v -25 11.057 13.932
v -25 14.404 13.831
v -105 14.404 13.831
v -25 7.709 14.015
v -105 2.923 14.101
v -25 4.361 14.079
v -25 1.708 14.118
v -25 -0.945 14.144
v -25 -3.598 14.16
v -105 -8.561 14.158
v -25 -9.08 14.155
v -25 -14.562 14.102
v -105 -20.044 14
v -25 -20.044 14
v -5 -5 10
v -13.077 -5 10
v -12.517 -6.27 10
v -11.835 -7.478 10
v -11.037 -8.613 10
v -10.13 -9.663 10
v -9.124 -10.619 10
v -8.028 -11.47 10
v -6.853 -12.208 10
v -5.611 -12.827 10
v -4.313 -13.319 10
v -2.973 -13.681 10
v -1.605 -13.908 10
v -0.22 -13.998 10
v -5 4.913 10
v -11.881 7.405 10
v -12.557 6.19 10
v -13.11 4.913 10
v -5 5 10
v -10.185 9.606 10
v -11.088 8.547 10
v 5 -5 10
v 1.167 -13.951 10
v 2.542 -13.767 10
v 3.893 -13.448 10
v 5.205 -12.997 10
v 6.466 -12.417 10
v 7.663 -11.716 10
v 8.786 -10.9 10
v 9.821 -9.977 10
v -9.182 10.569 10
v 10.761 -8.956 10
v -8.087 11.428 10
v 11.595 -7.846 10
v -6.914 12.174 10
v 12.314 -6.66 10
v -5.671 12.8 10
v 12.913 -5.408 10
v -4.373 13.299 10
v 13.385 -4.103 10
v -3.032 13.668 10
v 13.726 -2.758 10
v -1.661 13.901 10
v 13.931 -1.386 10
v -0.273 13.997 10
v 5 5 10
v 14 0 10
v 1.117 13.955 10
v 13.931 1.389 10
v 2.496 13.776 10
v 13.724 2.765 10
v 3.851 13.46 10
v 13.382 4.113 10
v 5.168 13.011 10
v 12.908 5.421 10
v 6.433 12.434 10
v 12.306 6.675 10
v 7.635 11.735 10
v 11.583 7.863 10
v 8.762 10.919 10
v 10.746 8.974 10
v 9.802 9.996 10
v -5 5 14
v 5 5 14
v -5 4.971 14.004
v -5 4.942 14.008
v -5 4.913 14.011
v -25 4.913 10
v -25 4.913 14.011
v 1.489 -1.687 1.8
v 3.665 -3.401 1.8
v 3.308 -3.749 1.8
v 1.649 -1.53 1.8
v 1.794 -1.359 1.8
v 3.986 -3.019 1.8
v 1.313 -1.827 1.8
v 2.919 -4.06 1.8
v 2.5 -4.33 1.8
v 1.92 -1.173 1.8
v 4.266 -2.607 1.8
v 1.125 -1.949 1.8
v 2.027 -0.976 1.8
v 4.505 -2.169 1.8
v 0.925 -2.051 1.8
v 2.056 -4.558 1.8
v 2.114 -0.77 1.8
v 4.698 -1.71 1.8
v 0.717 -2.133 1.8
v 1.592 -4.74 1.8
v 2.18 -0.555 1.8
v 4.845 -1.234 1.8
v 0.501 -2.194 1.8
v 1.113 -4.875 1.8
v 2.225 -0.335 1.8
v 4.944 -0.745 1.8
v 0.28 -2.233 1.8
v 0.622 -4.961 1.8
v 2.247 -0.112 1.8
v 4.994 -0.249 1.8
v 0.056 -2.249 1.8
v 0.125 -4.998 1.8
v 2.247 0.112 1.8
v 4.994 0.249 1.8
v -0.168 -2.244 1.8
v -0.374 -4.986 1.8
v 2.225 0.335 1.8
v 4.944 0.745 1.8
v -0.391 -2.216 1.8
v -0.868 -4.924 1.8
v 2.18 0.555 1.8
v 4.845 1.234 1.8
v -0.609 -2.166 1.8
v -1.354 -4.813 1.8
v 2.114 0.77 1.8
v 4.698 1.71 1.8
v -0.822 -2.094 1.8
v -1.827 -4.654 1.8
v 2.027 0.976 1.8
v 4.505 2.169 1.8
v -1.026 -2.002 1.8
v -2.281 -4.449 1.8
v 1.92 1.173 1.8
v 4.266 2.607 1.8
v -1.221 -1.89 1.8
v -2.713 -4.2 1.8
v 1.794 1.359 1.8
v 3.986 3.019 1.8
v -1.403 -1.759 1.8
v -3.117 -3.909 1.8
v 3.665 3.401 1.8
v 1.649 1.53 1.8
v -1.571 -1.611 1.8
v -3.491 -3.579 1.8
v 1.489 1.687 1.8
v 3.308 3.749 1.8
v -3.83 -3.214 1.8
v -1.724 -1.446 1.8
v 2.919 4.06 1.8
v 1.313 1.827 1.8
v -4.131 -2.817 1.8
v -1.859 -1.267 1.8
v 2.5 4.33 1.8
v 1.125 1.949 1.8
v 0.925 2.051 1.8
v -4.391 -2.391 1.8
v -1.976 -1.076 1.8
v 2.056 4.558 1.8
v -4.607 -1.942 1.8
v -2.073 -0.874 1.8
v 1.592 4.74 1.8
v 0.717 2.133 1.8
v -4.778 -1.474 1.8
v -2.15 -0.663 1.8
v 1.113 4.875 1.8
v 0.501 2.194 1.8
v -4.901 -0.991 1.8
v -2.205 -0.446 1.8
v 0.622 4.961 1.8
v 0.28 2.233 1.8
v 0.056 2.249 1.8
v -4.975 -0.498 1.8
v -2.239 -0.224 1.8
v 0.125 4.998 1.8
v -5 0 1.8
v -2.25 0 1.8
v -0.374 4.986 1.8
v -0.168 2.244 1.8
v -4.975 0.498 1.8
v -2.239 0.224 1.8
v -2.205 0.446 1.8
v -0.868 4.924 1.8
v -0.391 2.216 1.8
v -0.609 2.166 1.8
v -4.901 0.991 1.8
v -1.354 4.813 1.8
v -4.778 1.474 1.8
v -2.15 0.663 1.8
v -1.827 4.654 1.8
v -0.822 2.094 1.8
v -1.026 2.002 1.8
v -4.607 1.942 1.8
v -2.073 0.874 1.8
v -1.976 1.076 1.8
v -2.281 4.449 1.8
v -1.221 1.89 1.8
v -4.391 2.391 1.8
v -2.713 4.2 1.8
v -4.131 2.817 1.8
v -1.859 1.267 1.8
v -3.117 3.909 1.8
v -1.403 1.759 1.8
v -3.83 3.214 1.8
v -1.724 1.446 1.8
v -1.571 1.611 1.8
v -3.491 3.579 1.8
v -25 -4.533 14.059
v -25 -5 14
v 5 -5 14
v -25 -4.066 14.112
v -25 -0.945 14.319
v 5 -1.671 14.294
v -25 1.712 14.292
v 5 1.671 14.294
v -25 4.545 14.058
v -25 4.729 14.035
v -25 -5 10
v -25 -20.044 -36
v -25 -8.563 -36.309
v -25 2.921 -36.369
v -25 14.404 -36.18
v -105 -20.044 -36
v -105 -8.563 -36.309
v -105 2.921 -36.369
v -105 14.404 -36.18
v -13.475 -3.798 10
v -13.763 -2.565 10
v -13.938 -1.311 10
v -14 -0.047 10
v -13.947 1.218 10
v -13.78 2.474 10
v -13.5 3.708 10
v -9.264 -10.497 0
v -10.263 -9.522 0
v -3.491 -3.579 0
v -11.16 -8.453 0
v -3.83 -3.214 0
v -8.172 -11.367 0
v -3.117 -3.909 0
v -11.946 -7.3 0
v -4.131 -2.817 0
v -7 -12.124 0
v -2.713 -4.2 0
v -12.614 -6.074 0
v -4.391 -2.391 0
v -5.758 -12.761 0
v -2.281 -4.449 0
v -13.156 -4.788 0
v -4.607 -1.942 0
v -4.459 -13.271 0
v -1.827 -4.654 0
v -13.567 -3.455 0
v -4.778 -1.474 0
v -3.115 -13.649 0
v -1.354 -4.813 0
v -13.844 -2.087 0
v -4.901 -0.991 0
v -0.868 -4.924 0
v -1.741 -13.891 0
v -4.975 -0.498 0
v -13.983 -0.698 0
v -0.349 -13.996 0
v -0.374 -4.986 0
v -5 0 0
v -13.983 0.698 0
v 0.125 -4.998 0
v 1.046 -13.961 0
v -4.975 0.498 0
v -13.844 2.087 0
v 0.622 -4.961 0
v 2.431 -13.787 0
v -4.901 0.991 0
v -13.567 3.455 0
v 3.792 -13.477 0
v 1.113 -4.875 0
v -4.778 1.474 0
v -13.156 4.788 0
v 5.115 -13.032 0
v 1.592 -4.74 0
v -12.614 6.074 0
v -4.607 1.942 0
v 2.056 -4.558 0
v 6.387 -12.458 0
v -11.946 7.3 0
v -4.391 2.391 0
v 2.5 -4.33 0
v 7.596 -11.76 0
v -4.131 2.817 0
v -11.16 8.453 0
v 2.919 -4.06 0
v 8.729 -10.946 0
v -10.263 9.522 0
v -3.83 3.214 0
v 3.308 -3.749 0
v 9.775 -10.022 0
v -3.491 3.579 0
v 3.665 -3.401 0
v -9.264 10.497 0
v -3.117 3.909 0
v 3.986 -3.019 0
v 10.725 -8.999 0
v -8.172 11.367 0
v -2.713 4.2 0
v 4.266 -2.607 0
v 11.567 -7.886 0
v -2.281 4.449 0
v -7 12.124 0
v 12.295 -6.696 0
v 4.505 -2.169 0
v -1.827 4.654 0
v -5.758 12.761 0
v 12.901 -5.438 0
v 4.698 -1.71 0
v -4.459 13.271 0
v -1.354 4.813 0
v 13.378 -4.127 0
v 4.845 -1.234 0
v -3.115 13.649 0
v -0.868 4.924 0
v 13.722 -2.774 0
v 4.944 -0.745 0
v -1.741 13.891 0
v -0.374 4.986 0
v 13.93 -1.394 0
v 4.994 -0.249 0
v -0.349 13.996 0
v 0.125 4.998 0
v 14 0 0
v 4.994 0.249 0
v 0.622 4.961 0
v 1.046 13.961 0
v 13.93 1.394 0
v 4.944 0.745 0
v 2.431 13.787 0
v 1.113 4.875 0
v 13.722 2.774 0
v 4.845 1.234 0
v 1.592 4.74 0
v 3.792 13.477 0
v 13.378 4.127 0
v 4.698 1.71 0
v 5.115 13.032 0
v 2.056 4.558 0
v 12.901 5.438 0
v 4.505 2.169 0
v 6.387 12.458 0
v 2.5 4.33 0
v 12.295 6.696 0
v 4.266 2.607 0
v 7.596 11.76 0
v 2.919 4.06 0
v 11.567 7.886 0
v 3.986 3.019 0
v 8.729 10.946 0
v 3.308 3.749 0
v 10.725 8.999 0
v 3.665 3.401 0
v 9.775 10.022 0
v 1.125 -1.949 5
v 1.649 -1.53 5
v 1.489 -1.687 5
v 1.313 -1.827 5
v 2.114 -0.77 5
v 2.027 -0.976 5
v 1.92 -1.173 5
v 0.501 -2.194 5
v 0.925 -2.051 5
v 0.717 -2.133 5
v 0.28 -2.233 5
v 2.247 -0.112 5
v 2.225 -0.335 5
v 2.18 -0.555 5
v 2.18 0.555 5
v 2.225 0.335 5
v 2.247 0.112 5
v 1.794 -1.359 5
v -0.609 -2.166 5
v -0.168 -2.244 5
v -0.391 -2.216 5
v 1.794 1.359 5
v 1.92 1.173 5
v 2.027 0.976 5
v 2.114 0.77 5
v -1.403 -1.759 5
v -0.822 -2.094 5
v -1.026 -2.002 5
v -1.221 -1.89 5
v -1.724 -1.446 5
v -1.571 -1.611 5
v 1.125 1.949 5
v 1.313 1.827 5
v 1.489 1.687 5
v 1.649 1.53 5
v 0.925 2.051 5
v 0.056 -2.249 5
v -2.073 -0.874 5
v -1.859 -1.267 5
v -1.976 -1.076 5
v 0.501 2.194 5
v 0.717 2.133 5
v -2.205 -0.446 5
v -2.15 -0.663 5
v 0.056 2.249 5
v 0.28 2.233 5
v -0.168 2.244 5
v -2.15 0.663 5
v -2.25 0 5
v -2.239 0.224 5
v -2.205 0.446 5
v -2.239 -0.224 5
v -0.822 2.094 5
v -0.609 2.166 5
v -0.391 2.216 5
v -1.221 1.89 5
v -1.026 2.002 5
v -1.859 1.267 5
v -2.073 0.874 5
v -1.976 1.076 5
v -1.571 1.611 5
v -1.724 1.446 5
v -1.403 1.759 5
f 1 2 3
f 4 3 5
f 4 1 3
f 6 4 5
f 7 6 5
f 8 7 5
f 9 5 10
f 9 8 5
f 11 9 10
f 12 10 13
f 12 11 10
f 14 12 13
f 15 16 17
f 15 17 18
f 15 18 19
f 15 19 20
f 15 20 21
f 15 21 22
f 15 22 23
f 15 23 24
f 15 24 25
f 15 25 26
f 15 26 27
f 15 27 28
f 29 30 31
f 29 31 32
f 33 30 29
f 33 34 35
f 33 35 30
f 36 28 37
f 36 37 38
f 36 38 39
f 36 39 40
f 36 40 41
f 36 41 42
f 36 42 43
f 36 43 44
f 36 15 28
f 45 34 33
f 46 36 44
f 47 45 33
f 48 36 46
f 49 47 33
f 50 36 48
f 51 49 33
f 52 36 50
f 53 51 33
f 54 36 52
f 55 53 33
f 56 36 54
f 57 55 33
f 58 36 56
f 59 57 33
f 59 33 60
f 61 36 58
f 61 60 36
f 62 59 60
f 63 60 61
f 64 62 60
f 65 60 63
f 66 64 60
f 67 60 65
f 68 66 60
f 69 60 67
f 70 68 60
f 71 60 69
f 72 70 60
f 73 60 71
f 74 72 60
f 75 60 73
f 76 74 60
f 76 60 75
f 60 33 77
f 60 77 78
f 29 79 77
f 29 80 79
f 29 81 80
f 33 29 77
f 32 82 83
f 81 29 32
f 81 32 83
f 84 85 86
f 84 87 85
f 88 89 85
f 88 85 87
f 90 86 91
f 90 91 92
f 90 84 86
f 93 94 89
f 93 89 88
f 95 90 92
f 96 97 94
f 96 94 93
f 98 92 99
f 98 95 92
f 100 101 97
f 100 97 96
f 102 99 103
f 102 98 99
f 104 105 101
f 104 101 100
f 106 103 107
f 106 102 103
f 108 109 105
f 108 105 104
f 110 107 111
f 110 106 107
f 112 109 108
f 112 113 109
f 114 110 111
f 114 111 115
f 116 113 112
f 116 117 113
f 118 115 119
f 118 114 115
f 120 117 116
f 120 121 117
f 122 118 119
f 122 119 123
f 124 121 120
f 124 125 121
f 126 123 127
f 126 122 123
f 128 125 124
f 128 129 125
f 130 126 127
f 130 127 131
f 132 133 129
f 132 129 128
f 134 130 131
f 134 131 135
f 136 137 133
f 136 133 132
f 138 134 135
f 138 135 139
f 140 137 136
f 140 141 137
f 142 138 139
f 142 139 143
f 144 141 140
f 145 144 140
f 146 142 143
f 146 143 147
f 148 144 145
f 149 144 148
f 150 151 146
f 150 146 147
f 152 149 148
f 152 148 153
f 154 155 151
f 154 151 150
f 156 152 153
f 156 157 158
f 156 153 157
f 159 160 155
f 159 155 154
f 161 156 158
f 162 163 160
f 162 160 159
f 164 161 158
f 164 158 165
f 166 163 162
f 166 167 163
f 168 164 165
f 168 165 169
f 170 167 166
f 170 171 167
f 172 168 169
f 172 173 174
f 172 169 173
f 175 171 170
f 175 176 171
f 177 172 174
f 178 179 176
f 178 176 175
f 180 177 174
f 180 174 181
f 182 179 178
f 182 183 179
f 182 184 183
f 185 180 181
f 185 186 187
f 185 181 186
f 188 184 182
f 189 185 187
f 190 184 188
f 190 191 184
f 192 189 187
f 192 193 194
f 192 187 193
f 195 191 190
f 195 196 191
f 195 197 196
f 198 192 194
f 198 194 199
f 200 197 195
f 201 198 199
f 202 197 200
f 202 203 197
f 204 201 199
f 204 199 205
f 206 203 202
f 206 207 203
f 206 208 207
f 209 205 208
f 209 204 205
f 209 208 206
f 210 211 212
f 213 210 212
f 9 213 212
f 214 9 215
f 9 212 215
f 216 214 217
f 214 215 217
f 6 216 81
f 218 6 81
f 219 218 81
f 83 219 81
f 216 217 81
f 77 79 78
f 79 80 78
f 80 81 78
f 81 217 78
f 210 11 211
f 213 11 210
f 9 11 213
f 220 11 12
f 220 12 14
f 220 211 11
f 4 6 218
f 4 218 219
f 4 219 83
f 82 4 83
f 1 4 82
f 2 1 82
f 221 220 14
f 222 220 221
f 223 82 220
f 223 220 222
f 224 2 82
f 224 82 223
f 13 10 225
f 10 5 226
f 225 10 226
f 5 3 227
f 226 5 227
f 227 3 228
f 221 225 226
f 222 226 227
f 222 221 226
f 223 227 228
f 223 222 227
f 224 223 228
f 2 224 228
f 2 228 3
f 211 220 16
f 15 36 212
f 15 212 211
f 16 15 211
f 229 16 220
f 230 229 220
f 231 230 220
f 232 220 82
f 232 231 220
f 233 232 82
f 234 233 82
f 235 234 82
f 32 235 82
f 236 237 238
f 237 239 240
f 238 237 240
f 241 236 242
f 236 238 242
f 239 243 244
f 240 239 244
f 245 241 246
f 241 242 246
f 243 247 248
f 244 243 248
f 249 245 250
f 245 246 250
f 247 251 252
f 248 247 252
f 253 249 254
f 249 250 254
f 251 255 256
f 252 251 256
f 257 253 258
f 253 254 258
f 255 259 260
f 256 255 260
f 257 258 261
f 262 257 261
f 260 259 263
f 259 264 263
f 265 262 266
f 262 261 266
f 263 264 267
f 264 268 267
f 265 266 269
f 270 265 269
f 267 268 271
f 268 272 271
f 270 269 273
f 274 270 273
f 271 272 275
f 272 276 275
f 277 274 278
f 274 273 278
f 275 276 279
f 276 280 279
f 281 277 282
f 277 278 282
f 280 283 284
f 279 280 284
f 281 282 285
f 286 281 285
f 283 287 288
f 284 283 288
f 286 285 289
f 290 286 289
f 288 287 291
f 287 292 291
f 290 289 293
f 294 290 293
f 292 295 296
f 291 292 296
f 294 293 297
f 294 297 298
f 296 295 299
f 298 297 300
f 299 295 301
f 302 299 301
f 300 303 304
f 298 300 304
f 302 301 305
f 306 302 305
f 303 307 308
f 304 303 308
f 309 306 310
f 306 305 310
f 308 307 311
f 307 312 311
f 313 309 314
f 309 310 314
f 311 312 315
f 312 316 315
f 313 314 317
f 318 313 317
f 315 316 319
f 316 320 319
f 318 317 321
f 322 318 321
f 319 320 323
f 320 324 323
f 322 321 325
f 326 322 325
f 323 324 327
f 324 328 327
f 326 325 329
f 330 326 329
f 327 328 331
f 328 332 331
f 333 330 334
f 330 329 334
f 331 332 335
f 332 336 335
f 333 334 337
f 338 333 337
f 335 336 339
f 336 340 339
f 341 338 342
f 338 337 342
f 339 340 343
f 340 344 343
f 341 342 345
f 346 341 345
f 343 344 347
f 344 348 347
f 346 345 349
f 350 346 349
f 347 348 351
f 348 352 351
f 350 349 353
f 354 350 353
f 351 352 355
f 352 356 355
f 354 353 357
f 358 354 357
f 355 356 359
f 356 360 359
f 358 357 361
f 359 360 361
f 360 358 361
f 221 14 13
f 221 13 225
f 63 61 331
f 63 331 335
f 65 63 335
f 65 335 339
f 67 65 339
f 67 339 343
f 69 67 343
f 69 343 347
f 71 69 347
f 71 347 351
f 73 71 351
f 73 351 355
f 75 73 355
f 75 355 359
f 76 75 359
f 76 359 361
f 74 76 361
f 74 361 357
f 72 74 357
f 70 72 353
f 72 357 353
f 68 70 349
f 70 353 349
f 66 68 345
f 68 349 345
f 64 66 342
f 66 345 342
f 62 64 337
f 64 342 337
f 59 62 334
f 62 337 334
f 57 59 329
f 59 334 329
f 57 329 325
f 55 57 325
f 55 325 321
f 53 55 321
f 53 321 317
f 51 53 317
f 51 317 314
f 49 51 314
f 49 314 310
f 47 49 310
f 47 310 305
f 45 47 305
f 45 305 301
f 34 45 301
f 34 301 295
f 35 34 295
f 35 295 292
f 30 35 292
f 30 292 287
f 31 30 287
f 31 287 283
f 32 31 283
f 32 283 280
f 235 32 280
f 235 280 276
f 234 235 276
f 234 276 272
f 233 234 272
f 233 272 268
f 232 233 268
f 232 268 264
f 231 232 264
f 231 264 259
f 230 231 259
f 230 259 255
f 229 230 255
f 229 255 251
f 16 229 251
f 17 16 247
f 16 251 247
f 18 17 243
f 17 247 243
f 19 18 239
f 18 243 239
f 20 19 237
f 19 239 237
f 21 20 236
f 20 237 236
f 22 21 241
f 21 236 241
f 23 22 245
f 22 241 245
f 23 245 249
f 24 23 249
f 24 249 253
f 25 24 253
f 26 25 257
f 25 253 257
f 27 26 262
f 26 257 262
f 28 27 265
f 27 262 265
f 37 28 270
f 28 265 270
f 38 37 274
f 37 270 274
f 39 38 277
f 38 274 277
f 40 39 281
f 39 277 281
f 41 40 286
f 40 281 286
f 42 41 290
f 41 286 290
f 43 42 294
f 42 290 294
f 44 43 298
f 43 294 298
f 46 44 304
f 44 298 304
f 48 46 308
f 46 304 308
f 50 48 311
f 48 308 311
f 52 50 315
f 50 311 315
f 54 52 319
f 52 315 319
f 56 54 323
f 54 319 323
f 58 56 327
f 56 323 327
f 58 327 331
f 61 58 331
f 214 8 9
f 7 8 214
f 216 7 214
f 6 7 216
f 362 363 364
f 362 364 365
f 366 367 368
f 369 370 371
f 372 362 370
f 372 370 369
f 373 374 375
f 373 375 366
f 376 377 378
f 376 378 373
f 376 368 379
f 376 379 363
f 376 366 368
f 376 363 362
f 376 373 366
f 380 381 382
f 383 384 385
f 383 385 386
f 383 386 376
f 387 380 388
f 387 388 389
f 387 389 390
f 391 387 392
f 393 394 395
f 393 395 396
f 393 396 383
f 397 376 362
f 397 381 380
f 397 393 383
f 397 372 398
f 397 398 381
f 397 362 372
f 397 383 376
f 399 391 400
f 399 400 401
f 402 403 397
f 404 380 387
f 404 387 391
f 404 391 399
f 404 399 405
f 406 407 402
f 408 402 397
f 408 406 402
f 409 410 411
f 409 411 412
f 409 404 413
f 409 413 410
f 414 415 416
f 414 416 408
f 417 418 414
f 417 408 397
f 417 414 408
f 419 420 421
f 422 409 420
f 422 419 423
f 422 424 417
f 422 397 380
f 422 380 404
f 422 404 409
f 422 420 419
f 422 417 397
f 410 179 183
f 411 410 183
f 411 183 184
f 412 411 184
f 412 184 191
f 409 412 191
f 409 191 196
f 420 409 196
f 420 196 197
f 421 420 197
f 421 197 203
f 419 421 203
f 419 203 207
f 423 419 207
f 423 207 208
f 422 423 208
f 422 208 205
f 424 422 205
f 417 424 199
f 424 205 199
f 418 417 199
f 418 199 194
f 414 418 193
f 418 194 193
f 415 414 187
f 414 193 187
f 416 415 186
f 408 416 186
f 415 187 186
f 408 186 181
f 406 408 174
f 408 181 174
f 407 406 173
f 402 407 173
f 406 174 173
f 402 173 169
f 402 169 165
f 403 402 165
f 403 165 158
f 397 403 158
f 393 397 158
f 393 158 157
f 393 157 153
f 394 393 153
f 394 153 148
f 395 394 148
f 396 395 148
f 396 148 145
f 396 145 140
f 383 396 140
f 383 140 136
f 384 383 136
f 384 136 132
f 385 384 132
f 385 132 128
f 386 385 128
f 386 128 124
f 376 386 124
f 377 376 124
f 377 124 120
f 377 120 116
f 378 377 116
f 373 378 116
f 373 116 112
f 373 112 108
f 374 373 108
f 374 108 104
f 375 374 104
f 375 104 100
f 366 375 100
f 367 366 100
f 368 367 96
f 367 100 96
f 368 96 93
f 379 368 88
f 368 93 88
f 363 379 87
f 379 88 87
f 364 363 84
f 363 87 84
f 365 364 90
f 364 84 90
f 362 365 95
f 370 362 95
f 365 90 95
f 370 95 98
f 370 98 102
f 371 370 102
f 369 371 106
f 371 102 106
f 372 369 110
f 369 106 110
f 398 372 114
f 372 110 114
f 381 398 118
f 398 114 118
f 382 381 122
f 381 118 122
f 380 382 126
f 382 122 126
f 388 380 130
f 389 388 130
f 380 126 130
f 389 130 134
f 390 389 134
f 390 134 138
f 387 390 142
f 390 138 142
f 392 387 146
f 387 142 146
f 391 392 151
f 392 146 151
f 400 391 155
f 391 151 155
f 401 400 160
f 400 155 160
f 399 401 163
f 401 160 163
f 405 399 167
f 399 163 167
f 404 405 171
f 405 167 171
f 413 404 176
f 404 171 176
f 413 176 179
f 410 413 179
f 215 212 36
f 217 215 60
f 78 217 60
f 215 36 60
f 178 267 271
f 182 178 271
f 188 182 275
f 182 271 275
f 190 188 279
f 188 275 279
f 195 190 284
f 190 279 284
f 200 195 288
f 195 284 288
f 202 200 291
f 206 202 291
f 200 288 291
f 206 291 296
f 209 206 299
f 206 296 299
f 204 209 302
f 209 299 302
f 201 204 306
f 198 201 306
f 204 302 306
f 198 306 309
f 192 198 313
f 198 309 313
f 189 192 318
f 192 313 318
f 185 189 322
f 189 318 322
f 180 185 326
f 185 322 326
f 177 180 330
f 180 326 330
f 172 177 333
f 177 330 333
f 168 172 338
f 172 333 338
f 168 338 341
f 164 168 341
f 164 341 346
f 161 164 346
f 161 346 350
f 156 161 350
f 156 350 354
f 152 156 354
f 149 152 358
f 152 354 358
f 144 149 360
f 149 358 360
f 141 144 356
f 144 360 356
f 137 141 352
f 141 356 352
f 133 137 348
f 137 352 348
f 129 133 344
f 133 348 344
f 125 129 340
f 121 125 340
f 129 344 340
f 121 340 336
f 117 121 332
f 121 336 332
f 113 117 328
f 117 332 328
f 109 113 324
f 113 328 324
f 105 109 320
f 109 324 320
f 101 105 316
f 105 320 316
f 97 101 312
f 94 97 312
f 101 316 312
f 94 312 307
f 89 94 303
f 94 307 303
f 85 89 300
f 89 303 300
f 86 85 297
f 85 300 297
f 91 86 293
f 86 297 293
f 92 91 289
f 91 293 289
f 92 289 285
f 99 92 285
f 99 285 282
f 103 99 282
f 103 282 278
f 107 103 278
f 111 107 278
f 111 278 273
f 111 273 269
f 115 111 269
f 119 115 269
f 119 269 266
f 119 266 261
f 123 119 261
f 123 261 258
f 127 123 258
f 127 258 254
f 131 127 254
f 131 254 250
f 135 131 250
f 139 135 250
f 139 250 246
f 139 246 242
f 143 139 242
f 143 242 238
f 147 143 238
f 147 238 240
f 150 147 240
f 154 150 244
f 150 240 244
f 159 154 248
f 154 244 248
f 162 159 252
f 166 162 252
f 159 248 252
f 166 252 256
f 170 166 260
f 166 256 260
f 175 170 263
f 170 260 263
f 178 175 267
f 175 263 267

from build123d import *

# Parameters (mm, degrees)
SKETCH1_R           = 14
BOSS_EXTRUDE1_DEPTH = 10
SKETCH2_R           = 2.25
CUT_EXTRUDE1_DEPTH  = 5
SKETCH3_R           = 5
CUT_EXTRUDE2_DEPTH  = 1.8
SKETCH4_W           = 10
SKETCH4_H           = 10
BOSS_EXTRUDE2_DEPTH = 8
SKETCH6_W           = 8
SKETCH6_H           = 9.912865289
BOSS_EXTRUDE3_DEPTH = 20
CUT_EXTRUDE3_DEPTH  = 30
BOSS_EXTRUDE4_DEPTH = 80


with BuildPart() as part:
    # Sketch1 → Boss-Extrude1 (new body)
    with BuildSketch(Plane.XY):
        Circle(SKETCH1_R)
    extrude(amount=BOSS_EXTRUDE1_DEPTH)

    # Sketch2 → Cut-Extrude1 (cut)
    with BuildSketch(Plane(origin=(0, 0, 0), x_dir=(-1, 0, 0), z_dir=(0, 0, -1))):
        Circle(SKETCH2_R)
    extrude(amount=-CUT_EXTRUDE1_DEPTH, mode=Mode.SUBTRACT)

    # Sketch3 → Cut-Extrude2 (cut)
    with BuildSketch(Plane(origin=(0, 0, 0), x_dir=(-1, 0, 0), z_dir=(0, 0, -1))):
        Circle(SKETCH3_R)
    extrude(amount=-CUT_EXTRUDE2_DEPTH, mode=Mode.SUBTRACT)

    # Sketch4 → Boss-Extrude2 (add)
    with BuildSketch(Plane.XY.offset(10)):
        Rectangle(SKETCH4_W, SKETCH4_H)
    extrude(amount=BOSS_EXTRUDE2_DEPTH)

    # Sketch6 → Boss-Extrude3 (add)
    with BuildSketch(Plane.ZY.offset(5)):
        with Locations((14, -0.043567356)):
            Rectangle(SKETCH6_W, SKETCH6_H)
    extrude(amount=BOSS_EXTRUDE3_DEPTH)

    # Sketch7 → Cut-Extrude3 (cut)
    with BuildSketch(Plane(origin=(5, 0, 0), x_dir=(0, 0, -1), z_dir=(1, 0, 0))):
        with BuildLine():
            Line((-18, 5), (-18, -5))
            Line((-18, -5), (-14, -5))
            ThreePointArc((-14, -5), (-14.330383596, 0), (-14, 5))
            Line((-14, 5), (-18, 5))
        make_face()
    extrude(amount=-CUT_EXTRUDE3_DEPTH, mode=Mode.SUBTRACT)

    # Sketch8 → Boss-Extrude4 (add)
    with BuildSketch(Plane.ZY.offset(25)):
        with BuildLine():
            Line((-36.180314108, 14.403585903), (13.83114902, 14.403585903))
            ThreePointArc((13.83114902, 14.403585903), (14.156322075, -2.818810644), (14, -20.043567356))
            Line((14, -20.043567356), (-36, -20.043567356))
            ThreePointArc((-36, -20.043567356), (-36.369728572, -2.821454147), (-36.180314108, 14.403585903))
        make_face()
    extrude(amount=BOSS_EXTRUDE4_DEPTH)


solid = part.part
